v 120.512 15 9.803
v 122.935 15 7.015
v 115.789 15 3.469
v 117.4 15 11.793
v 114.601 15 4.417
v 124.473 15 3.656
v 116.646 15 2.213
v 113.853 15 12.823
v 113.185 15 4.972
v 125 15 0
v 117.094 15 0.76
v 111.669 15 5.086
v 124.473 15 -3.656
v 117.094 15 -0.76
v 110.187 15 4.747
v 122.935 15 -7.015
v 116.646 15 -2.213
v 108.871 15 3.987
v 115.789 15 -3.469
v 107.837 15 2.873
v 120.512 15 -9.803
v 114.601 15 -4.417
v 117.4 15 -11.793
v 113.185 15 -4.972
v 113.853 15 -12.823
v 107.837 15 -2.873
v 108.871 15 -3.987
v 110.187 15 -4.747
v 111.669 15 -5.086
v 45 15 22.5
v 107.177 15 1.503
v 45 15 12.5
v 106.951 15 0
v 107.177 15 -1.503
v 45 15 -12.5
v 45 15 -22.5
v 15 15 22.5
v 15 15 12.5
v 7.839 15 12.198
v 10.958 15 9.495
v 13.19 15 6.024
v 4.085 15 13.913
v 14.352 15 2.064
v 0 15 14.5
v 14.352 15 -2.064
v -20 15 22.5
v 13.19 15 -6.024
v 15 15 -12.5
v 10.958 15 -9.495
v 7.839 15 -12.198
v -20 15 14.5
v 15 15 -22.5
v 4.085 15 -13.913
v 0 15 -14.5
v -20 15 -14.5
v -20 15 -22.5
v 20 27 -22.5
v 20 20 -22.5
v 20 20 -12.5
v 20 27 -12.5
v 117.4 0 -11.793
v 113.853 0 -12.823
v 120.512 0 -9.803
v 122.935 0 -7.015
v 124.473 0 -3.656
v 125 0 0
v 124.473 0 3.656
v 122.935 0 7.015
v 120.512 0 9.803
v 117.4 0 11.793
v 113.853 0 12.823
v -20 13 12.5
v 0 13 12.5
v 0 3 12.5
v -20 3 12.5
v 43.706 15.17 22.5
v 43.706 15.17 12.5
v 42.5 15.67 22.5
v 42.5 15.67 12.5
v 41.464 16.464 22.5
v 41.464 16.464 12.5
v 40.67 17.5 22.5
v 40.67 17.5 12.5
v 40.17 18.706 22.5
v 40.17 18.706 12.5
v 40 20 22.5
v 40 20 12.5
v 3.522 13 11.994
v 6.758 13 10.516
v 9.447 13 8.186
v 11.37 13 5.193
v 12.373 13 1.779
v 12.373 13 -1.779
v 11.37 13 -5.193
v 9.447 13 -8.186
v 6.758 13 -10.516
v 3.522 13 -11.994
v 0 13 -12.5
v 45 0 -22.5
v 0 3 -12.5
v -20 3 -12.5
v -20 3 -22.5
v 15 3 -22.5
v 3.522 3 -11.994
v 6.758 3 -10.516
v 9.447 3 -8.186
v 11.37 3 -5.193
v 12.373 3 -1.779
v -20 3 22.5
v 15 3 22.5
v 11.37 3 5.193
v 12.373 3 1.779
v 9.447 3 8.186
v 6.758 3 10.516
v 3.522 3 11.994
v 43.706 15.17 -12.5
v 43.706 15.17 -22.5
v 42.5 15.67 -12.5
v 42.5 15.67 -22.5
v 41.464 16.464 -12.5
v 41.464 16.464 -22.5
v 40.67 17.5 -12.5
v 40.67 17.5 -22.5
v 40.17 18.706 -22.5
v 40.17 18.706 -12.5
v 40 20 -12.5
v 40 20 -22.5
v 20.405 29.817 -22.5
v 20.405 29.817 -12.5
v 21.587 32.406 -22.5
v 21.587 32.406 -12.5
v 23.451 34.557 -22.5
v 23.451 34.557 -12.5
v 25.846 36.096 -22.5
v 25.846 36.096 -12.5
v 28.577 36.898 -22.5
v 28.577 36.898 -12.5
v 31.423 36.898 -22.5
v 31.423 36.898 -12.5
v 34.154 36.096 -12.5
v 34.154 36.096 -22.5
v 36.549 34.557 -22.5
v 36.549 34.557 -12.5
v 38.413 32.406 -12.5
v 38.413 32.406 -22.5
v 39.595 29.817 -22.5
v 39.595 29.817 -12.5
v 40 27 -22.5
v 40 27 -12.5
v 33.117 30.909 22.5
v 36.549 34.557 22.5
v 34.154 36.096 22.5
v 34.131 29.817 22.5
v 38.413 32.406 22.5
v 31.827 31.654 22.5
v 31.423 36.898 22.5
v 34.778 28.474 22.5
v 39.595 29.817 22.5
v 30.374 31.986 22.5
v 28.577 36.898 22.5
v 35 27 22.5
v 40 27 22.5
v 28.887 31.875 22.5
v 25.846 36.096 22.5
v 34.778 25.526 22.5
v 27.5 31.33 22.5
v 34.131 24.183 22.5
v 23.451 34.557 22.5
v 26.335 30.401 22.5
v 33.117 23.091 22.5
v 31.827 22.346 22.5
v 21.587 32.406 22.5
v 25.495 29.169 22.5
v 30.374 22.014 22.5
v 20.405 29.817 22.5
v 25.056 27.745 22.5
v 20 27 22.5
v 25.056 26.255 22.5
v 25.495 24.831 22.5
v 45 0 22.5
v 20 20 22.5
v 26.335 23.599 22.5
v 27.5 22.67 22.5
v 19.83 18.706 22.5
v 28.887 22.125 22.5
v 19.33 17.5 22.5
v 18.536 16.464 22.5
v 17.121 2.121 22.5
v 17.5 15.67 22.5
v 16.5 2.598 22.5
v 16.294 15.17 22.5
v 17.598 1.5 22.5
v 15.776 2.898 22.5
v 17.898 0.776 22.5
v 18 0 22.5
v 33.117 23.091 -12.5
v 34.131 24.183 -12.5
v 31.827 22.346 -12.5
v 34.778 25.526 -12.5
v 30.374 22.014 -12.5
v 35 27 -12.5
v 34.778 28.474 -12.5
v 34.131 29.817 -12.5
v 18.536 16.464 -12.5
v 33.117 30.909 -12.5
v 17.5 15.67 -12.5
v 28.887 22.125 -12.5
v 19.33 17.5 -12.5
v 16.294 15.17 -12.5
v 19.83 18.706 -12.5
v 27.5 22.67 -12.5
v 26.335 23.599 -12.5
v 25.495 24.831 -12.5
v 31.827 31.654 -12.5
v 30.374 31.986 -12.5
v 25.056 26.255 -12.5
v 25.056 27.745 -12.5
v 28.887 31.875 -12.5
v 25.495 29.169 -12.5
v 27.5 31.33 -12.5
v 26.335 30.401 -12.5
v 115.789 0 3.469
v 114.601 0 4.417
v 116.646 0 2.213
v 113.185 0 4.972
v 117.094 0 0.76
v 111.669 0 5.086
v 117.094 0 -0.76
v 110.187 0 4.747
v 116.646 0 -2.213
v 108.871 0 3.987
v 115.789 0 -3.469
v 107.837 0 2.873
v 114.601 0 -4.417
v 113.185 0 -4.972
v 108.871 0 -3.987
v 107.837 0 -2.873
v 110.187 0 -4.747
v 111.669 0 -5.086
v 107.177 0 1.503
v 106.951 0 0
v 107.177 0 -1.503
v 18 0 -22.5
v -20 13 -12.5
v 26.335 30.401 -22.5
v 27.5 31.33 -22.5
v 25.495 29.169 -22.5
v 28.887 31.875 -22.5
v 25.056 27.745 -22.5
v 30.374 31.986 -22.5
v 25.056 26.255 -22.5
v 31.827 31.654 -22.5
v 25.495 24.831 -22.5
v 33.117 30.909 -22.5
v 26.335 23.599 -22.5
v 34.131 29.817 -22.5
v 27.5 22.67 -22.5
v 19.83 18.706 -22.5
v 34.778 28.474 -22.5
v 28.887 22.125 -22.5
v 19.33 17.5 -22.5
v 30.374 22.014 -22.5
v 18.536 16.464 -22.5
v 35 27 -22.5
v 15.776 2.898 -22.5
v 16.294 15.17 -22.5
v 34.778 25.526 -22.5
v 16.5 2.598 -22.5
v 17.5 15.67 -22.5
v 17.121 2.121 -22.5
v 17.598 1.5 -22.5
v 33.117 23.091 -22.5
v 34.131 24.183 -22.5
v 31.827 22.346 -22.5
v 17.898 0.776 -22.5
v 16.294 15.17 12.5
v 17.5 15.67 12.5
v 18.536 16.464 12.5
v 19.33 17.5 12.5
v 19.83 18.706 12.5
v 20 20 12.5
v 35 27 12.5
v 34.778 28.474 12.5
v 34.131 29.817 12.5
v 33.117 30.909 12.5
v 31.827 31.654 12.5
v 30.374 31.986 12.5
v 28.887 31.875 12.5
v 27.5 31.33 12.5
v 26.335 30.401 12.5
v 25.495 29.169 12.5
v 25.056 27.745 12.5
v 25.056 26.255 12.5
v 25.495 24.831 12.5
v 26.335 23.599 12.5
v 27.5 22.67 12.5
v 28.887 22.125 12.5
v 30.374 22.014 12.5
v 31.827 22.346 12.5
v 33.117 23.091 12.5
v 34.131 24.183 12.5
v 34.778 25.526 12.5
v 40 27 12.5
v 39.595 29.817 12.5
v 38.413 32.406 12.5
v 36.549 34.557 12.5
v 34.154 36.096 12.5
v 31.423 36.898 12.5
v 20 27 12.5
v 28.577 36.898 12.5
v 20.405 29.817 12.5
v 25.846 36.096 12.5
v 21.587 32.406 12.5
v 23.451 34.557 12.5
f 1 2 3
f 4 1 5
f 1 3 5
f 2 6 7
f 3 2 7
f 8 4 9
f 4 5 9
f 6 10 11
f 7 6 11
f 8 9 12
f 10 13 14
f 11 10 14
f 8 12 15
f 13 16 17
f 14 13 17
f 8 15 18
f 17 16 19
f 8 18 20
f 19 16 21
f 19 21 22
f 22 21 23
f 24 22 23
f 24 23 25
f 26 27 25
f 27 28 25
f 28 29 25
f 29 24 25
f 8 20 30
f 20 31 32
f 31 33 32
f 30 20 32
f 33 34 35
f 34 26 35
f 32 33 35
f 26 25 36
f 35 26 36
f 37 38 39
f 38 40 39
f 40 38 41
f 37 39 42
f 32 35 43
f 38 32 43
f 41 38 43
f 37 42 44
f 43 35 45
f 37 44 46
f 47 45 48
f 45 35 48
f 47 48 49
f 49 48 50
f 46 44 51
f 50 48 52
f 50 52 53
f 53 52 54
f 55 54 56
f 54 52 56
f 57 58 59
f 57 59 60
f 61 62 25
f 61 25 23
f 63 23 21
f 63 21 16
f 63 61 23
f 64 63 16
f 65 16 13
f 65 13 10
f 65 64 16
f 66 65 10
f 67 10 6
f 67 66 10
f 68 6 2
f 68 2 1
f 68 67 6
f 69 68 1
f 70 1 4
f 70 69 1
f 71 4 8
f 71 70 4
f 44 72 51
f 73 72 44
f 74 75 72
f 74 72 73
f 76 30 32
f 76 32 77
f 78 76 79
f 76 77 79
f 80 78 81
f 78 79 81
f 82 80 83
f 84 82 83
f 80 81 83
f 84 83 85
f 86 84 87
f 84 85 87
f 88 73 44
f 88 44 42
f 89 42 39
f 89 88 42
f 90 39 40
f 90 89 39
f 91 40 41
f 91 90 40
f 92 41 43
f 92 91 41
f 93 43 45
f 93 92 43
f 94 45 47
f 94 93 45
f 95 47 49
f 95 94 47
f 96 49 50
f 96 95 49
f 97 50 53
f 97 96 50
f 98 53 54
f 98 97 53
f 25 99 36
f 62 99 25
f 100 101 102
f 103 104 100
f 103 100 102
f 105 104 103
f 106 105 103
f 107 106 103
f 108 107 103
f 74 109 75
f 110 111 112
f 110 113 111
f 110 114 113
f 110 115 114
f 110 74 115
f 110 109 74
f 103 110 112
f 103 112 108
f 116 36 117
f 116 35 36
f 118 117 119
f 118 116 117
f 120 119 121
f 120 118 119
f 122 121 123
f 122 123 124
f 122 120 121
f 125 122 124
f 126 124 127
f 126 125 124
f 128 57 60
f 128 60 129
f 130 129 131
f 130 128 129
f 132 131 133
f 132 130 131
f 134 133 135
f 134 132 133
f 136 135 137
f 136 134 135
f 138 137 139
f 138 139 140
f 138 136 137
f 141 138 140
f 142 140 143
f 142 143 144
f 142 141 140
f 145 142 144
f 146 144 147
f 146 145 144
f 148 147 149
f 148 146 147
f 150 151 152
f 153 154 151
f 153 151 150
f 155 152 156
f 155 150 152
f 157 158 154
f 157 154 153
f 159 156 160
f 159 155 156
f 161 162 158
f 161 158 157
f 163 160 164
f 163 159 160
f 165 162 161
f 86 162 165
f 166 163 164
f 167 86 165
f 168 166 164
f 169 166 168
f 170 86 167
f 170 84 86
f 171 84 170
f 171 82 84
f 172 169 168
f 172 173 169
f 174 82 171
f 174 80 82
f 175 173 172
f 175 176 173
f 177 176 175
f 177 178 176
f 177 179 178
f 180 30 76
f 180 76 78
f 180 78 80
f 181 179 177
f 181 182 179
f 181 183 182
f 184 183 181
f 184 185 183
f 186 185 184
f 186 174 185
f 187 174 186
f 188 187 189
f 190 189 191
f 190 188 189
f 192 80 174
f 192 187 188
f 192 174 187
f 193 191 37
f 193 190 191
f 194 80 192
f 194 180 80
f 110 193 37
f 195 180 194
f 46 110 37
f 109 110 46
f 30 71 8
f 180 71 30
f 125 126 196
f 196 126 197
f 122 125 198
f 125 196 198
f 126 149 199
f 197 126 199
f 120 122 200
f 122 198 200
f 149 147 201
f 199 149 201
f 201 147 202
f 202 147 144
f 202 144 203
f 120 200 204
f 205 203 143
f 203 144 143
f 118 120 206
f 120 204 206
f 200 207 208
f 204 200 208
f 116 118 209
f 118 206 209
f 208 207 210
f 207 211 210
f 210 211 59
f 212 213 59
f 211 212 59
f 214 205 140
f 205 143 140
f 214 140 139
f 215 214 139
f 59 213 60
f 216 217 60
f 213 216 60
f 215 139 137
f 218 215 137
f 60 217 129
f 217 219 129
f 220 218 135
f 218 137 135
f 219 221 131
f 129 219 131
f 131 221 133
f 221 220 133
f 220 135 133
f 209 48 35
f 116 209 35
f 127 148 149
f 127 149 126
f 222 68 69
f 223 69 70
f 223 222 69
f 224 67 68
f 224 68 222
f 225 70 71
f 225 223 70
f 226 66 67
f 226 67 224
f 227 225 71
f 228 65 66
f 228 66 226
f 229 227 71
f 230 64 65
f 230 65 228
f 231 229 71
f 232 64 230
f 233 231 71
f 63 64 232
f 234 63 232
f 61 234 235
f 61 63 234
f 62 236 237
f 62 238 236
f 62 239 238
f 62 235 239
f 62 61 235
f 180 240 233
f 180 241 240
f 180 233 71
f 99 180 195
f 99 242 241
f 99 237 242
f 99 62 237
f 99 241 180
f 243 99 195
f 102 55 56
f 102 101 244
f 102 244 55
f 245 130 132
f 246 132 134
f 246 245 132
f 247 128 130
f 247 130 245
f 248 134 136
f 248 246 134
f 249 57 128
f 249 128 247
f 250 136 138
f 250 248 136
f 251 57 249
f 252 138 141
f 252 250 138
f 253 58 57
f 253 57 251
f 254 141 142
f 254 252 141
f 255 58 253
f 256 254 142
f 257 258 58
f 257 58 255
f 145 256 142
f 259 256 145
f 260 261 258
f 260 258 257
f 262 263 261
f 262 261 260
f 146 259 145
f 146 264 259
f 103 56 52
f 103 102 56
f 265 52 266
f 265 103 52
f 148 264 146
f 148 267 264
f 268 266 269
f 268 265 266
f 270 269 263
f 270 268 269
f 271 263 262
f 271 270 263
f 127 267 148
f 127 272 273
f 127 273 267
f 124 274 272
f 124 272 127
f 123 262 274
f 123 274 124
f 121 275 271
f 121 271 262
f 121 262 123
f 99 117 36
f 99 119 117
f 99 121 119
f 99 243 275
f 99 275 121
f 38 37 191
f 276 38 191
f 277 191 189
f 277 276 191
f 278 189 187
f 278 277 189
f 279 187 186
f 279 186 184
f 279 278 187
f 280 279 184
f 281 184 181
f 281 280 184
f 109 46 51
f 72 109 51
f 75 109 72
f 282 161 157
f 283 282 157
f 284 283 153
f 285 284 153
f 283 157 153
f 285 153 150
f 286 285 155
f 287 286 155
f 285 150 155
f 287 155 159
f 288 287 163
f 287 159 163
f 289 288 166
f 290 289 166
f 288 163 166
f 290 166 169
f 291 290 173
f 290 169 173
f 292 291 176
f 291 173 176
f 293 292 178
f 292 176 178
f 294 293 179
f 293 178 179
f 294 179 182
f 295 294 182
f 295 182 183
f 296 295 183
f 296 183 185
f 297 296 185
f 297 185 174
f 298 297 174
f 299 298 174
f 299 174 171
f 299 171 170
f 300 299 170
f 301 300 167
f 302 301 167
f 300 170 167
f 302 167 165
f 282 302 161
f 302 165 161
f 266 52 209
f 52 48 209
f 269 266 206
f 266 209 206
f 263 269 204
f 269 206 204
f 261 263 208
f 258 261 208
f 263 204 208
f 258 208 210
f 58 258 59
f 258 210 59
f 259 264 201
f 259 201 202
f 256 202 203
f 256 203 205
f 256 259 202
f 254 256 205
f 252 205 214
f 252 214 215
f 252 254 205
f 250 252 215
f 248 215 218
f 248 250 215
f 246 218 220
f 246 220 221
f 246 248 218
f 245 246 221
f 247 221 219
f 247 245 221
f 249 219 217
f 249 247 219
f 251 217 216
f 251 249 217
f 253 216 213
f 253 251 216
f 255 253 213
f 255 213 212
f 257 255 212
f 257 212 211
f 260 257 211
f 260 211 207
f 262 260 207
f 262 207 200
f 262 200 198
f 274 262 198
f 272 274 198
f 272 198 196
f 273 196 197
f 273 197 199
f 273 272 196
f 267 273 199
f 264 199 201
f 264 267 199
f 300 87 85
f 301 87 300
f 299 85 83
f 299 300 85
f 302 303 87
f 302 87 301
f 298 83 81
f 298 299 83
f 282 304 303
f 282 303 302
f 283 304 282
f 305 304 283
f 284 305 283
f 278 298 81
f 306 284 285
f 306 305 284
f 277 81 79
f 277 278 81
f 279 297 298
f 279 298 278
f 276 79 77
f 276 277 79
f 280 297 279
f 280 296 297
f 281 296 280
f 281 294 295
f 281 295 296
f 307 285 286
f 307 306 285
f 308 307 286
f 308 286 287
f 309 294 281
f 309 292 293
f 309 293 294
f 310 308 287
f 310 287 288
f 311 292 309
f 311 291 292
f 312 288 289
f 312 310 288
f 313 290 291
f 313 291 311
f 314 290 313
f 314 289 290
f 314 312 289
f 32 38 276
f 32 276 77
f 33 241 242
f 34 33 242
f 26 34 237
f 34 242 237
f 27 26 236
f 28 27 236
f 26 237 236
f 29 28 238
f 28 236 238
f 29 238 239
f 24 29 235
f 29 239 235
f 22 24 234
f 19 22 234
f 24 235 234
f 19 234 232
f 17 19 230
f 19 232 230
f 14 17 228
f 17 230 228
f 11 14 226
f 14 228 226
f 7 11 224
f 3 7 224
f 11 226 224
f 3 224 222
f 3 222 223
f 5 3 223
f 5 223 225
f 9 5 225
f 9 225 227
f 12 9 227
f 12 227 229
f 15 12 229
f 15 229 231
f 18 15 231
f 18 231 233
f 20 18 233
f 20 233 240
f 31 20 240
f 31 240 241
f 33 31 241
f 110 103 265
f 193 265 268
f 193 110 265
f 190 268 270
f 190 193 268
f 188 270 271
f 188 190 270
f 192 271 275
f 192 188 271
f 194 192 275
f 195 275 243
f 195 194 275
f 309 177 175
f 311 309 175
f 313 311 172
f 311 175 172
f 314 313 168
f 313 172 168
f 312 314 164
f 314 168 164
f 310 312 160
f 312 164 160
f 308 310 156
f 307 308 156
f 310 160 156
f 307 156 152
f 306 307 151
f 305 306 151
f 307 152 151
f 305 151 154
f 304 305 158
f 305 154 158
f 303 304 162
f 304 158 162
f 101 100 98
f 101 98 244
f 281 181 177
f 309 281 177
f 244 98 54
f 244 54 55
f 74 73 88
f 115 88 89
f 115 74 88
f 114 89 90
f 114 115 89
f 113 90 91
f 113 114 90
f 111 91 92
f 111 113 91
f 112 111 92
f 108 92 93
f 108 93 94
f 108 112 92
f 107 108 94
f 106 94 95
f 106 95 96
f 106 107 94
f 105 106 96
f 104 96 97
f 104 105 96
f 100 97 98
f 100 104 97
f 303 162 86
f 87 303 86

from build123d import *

# Parameters (mm, degrees)
DODANIE_WYCI_GNI_CIE1_DEPTH = 15
WYTNIJ_WYCI_GNI_CIE1_DEPTH  = 46
SZKIC3_R                    = 5
DODANIE_WYCI_GNI_CIE2_DEPTH = 10
ZAOKR_GLENIE1_R             = 5
ZAOKR_GLENIE1_OF_LUSTRO1_R  = 5
SFAZOWANIE1_SIZE            = 2
OTW_R_GWINTOWANY_M121_D     = 10.2


with BuildPart() as part:
    # Szkic1 → Dodanie-wyciągnięcie1 (new body)
    with BuildSketch(Plane(origin=(0, 0, 0), x_dir=(1, 0, 0), z_dir=(0, 1, 0))):
        with BuildLine():
            Line((-20, 12.5), (-20, 22.5))
            Line((-20, 22.5), (45, 22.5))
            Line((45, 22.5), (113.85281653, 12.823367693))
            ThreePointArc((113.85281653, 12.823367693), (125, 0), (113.85281653, -12.823367693))
            Line((113.85281653, -12.823367693), (45, -22.5))
            Line((45, -22.5), (-20, -22.5))
            Line((-20, -22.5), (-20, -12.5))
            Line((-20, -12.5), (0, -12.5))
            ThreePointArc((0, -12.5), (12.5, 0), (0, 12.5))
            Line((0, 12.5), (-20, 12.5))
        make_face()
    extrude(amount=DODANIE_WYCI_GNI_CIE1_DEPTH)

    # Szkic2 → Wytnij-wyciągnięcie1 (cut, through all)
    with BuildSketch(Plane.XY.offset(22.5)):
        with BuildLine():
            Line((-20, 3), (15, 3))
            ThreePointArc((15, 3), (17.121320344, 2.121320344), (18, 0))
            Line((18, 0), (-20, 0))
            Line((-20, 0), (-20, 3))
        make_face()
    extrude(amount=-WYTNIJ_WYCI_GNI_CIE1_DEPTH, mode=Mode.SUBTRACT)

    # Szkic3 → Dodanie-wyciągnięcie2 (add)
    with BuildSketch(Plane.XY.offset(22.5)):
        with BuildLine():
            Line((20, 15), (20, 27))
            ThreePointArc((20, 27), (30, 37), (40, 27))
            Line((40, 27), (40, 15))
            Line((40, 15), (20, 15))
        make_face()
        with Locations((30, 27)):
            Circle(SZKIC3_R, mode=Mode.SUBTRACT)
    dodanie_wyci_gni_cie2 = extrude(amount=-DODANIE_WYCI_GNI_CIE2_DEPTH)

    # Zaokrąglenie1
    zaokr_glenie1_edges = [part.edges().sort_by_distance(p)[0] for p in [
        (40, 15, 17.5),
        (20, 15, 17.5),
    ]]
    fillet(zaokr_glenie1_edges, radius=ZAOKR_GLENIE1_R)

    # Lustro1: Dodanie-wyciągnięcie2 across plane
    add(dodanie_wyci_gni_cie2.mirror(Plane.XY))

    # Zaokrąglenie1 of Lustro1
    zaokr_glenie1_of_lustro1_edges = [part.edges().sort_by_distance(p)[0] for p in [
        (40, 15, -17.5),
        (20, 15, -17.5),
    ]]
    fillet(zaokr_glenie1_of_lustro1_edges, radius=ZAOKR_GLENIE1_OF_LUSTRO1_R)

    # Sfazowanie1
    sfazowanie1_edges = [part.edges().sort_by_distance(p)[0] for p in [
        (-10, 15, 12.5),
        (-10, 15, -12.5),
        (12.5, 15, 0),
    ]]
    chamfer(sfazowanie1_edges, length=SFAZOWANIE1_SIZE)

    # Otwór gwintowany M121 (through all)
    with Locations(Plane(origin=(0, 15, 0), x_dir=(1, 0, 0), z_dir=(0, 1, 0))):
        with Locations((112.050609731, 0)):
            Hole(OTW_R_GWINTOWANY_M121_D / 2)


solid = part.part
